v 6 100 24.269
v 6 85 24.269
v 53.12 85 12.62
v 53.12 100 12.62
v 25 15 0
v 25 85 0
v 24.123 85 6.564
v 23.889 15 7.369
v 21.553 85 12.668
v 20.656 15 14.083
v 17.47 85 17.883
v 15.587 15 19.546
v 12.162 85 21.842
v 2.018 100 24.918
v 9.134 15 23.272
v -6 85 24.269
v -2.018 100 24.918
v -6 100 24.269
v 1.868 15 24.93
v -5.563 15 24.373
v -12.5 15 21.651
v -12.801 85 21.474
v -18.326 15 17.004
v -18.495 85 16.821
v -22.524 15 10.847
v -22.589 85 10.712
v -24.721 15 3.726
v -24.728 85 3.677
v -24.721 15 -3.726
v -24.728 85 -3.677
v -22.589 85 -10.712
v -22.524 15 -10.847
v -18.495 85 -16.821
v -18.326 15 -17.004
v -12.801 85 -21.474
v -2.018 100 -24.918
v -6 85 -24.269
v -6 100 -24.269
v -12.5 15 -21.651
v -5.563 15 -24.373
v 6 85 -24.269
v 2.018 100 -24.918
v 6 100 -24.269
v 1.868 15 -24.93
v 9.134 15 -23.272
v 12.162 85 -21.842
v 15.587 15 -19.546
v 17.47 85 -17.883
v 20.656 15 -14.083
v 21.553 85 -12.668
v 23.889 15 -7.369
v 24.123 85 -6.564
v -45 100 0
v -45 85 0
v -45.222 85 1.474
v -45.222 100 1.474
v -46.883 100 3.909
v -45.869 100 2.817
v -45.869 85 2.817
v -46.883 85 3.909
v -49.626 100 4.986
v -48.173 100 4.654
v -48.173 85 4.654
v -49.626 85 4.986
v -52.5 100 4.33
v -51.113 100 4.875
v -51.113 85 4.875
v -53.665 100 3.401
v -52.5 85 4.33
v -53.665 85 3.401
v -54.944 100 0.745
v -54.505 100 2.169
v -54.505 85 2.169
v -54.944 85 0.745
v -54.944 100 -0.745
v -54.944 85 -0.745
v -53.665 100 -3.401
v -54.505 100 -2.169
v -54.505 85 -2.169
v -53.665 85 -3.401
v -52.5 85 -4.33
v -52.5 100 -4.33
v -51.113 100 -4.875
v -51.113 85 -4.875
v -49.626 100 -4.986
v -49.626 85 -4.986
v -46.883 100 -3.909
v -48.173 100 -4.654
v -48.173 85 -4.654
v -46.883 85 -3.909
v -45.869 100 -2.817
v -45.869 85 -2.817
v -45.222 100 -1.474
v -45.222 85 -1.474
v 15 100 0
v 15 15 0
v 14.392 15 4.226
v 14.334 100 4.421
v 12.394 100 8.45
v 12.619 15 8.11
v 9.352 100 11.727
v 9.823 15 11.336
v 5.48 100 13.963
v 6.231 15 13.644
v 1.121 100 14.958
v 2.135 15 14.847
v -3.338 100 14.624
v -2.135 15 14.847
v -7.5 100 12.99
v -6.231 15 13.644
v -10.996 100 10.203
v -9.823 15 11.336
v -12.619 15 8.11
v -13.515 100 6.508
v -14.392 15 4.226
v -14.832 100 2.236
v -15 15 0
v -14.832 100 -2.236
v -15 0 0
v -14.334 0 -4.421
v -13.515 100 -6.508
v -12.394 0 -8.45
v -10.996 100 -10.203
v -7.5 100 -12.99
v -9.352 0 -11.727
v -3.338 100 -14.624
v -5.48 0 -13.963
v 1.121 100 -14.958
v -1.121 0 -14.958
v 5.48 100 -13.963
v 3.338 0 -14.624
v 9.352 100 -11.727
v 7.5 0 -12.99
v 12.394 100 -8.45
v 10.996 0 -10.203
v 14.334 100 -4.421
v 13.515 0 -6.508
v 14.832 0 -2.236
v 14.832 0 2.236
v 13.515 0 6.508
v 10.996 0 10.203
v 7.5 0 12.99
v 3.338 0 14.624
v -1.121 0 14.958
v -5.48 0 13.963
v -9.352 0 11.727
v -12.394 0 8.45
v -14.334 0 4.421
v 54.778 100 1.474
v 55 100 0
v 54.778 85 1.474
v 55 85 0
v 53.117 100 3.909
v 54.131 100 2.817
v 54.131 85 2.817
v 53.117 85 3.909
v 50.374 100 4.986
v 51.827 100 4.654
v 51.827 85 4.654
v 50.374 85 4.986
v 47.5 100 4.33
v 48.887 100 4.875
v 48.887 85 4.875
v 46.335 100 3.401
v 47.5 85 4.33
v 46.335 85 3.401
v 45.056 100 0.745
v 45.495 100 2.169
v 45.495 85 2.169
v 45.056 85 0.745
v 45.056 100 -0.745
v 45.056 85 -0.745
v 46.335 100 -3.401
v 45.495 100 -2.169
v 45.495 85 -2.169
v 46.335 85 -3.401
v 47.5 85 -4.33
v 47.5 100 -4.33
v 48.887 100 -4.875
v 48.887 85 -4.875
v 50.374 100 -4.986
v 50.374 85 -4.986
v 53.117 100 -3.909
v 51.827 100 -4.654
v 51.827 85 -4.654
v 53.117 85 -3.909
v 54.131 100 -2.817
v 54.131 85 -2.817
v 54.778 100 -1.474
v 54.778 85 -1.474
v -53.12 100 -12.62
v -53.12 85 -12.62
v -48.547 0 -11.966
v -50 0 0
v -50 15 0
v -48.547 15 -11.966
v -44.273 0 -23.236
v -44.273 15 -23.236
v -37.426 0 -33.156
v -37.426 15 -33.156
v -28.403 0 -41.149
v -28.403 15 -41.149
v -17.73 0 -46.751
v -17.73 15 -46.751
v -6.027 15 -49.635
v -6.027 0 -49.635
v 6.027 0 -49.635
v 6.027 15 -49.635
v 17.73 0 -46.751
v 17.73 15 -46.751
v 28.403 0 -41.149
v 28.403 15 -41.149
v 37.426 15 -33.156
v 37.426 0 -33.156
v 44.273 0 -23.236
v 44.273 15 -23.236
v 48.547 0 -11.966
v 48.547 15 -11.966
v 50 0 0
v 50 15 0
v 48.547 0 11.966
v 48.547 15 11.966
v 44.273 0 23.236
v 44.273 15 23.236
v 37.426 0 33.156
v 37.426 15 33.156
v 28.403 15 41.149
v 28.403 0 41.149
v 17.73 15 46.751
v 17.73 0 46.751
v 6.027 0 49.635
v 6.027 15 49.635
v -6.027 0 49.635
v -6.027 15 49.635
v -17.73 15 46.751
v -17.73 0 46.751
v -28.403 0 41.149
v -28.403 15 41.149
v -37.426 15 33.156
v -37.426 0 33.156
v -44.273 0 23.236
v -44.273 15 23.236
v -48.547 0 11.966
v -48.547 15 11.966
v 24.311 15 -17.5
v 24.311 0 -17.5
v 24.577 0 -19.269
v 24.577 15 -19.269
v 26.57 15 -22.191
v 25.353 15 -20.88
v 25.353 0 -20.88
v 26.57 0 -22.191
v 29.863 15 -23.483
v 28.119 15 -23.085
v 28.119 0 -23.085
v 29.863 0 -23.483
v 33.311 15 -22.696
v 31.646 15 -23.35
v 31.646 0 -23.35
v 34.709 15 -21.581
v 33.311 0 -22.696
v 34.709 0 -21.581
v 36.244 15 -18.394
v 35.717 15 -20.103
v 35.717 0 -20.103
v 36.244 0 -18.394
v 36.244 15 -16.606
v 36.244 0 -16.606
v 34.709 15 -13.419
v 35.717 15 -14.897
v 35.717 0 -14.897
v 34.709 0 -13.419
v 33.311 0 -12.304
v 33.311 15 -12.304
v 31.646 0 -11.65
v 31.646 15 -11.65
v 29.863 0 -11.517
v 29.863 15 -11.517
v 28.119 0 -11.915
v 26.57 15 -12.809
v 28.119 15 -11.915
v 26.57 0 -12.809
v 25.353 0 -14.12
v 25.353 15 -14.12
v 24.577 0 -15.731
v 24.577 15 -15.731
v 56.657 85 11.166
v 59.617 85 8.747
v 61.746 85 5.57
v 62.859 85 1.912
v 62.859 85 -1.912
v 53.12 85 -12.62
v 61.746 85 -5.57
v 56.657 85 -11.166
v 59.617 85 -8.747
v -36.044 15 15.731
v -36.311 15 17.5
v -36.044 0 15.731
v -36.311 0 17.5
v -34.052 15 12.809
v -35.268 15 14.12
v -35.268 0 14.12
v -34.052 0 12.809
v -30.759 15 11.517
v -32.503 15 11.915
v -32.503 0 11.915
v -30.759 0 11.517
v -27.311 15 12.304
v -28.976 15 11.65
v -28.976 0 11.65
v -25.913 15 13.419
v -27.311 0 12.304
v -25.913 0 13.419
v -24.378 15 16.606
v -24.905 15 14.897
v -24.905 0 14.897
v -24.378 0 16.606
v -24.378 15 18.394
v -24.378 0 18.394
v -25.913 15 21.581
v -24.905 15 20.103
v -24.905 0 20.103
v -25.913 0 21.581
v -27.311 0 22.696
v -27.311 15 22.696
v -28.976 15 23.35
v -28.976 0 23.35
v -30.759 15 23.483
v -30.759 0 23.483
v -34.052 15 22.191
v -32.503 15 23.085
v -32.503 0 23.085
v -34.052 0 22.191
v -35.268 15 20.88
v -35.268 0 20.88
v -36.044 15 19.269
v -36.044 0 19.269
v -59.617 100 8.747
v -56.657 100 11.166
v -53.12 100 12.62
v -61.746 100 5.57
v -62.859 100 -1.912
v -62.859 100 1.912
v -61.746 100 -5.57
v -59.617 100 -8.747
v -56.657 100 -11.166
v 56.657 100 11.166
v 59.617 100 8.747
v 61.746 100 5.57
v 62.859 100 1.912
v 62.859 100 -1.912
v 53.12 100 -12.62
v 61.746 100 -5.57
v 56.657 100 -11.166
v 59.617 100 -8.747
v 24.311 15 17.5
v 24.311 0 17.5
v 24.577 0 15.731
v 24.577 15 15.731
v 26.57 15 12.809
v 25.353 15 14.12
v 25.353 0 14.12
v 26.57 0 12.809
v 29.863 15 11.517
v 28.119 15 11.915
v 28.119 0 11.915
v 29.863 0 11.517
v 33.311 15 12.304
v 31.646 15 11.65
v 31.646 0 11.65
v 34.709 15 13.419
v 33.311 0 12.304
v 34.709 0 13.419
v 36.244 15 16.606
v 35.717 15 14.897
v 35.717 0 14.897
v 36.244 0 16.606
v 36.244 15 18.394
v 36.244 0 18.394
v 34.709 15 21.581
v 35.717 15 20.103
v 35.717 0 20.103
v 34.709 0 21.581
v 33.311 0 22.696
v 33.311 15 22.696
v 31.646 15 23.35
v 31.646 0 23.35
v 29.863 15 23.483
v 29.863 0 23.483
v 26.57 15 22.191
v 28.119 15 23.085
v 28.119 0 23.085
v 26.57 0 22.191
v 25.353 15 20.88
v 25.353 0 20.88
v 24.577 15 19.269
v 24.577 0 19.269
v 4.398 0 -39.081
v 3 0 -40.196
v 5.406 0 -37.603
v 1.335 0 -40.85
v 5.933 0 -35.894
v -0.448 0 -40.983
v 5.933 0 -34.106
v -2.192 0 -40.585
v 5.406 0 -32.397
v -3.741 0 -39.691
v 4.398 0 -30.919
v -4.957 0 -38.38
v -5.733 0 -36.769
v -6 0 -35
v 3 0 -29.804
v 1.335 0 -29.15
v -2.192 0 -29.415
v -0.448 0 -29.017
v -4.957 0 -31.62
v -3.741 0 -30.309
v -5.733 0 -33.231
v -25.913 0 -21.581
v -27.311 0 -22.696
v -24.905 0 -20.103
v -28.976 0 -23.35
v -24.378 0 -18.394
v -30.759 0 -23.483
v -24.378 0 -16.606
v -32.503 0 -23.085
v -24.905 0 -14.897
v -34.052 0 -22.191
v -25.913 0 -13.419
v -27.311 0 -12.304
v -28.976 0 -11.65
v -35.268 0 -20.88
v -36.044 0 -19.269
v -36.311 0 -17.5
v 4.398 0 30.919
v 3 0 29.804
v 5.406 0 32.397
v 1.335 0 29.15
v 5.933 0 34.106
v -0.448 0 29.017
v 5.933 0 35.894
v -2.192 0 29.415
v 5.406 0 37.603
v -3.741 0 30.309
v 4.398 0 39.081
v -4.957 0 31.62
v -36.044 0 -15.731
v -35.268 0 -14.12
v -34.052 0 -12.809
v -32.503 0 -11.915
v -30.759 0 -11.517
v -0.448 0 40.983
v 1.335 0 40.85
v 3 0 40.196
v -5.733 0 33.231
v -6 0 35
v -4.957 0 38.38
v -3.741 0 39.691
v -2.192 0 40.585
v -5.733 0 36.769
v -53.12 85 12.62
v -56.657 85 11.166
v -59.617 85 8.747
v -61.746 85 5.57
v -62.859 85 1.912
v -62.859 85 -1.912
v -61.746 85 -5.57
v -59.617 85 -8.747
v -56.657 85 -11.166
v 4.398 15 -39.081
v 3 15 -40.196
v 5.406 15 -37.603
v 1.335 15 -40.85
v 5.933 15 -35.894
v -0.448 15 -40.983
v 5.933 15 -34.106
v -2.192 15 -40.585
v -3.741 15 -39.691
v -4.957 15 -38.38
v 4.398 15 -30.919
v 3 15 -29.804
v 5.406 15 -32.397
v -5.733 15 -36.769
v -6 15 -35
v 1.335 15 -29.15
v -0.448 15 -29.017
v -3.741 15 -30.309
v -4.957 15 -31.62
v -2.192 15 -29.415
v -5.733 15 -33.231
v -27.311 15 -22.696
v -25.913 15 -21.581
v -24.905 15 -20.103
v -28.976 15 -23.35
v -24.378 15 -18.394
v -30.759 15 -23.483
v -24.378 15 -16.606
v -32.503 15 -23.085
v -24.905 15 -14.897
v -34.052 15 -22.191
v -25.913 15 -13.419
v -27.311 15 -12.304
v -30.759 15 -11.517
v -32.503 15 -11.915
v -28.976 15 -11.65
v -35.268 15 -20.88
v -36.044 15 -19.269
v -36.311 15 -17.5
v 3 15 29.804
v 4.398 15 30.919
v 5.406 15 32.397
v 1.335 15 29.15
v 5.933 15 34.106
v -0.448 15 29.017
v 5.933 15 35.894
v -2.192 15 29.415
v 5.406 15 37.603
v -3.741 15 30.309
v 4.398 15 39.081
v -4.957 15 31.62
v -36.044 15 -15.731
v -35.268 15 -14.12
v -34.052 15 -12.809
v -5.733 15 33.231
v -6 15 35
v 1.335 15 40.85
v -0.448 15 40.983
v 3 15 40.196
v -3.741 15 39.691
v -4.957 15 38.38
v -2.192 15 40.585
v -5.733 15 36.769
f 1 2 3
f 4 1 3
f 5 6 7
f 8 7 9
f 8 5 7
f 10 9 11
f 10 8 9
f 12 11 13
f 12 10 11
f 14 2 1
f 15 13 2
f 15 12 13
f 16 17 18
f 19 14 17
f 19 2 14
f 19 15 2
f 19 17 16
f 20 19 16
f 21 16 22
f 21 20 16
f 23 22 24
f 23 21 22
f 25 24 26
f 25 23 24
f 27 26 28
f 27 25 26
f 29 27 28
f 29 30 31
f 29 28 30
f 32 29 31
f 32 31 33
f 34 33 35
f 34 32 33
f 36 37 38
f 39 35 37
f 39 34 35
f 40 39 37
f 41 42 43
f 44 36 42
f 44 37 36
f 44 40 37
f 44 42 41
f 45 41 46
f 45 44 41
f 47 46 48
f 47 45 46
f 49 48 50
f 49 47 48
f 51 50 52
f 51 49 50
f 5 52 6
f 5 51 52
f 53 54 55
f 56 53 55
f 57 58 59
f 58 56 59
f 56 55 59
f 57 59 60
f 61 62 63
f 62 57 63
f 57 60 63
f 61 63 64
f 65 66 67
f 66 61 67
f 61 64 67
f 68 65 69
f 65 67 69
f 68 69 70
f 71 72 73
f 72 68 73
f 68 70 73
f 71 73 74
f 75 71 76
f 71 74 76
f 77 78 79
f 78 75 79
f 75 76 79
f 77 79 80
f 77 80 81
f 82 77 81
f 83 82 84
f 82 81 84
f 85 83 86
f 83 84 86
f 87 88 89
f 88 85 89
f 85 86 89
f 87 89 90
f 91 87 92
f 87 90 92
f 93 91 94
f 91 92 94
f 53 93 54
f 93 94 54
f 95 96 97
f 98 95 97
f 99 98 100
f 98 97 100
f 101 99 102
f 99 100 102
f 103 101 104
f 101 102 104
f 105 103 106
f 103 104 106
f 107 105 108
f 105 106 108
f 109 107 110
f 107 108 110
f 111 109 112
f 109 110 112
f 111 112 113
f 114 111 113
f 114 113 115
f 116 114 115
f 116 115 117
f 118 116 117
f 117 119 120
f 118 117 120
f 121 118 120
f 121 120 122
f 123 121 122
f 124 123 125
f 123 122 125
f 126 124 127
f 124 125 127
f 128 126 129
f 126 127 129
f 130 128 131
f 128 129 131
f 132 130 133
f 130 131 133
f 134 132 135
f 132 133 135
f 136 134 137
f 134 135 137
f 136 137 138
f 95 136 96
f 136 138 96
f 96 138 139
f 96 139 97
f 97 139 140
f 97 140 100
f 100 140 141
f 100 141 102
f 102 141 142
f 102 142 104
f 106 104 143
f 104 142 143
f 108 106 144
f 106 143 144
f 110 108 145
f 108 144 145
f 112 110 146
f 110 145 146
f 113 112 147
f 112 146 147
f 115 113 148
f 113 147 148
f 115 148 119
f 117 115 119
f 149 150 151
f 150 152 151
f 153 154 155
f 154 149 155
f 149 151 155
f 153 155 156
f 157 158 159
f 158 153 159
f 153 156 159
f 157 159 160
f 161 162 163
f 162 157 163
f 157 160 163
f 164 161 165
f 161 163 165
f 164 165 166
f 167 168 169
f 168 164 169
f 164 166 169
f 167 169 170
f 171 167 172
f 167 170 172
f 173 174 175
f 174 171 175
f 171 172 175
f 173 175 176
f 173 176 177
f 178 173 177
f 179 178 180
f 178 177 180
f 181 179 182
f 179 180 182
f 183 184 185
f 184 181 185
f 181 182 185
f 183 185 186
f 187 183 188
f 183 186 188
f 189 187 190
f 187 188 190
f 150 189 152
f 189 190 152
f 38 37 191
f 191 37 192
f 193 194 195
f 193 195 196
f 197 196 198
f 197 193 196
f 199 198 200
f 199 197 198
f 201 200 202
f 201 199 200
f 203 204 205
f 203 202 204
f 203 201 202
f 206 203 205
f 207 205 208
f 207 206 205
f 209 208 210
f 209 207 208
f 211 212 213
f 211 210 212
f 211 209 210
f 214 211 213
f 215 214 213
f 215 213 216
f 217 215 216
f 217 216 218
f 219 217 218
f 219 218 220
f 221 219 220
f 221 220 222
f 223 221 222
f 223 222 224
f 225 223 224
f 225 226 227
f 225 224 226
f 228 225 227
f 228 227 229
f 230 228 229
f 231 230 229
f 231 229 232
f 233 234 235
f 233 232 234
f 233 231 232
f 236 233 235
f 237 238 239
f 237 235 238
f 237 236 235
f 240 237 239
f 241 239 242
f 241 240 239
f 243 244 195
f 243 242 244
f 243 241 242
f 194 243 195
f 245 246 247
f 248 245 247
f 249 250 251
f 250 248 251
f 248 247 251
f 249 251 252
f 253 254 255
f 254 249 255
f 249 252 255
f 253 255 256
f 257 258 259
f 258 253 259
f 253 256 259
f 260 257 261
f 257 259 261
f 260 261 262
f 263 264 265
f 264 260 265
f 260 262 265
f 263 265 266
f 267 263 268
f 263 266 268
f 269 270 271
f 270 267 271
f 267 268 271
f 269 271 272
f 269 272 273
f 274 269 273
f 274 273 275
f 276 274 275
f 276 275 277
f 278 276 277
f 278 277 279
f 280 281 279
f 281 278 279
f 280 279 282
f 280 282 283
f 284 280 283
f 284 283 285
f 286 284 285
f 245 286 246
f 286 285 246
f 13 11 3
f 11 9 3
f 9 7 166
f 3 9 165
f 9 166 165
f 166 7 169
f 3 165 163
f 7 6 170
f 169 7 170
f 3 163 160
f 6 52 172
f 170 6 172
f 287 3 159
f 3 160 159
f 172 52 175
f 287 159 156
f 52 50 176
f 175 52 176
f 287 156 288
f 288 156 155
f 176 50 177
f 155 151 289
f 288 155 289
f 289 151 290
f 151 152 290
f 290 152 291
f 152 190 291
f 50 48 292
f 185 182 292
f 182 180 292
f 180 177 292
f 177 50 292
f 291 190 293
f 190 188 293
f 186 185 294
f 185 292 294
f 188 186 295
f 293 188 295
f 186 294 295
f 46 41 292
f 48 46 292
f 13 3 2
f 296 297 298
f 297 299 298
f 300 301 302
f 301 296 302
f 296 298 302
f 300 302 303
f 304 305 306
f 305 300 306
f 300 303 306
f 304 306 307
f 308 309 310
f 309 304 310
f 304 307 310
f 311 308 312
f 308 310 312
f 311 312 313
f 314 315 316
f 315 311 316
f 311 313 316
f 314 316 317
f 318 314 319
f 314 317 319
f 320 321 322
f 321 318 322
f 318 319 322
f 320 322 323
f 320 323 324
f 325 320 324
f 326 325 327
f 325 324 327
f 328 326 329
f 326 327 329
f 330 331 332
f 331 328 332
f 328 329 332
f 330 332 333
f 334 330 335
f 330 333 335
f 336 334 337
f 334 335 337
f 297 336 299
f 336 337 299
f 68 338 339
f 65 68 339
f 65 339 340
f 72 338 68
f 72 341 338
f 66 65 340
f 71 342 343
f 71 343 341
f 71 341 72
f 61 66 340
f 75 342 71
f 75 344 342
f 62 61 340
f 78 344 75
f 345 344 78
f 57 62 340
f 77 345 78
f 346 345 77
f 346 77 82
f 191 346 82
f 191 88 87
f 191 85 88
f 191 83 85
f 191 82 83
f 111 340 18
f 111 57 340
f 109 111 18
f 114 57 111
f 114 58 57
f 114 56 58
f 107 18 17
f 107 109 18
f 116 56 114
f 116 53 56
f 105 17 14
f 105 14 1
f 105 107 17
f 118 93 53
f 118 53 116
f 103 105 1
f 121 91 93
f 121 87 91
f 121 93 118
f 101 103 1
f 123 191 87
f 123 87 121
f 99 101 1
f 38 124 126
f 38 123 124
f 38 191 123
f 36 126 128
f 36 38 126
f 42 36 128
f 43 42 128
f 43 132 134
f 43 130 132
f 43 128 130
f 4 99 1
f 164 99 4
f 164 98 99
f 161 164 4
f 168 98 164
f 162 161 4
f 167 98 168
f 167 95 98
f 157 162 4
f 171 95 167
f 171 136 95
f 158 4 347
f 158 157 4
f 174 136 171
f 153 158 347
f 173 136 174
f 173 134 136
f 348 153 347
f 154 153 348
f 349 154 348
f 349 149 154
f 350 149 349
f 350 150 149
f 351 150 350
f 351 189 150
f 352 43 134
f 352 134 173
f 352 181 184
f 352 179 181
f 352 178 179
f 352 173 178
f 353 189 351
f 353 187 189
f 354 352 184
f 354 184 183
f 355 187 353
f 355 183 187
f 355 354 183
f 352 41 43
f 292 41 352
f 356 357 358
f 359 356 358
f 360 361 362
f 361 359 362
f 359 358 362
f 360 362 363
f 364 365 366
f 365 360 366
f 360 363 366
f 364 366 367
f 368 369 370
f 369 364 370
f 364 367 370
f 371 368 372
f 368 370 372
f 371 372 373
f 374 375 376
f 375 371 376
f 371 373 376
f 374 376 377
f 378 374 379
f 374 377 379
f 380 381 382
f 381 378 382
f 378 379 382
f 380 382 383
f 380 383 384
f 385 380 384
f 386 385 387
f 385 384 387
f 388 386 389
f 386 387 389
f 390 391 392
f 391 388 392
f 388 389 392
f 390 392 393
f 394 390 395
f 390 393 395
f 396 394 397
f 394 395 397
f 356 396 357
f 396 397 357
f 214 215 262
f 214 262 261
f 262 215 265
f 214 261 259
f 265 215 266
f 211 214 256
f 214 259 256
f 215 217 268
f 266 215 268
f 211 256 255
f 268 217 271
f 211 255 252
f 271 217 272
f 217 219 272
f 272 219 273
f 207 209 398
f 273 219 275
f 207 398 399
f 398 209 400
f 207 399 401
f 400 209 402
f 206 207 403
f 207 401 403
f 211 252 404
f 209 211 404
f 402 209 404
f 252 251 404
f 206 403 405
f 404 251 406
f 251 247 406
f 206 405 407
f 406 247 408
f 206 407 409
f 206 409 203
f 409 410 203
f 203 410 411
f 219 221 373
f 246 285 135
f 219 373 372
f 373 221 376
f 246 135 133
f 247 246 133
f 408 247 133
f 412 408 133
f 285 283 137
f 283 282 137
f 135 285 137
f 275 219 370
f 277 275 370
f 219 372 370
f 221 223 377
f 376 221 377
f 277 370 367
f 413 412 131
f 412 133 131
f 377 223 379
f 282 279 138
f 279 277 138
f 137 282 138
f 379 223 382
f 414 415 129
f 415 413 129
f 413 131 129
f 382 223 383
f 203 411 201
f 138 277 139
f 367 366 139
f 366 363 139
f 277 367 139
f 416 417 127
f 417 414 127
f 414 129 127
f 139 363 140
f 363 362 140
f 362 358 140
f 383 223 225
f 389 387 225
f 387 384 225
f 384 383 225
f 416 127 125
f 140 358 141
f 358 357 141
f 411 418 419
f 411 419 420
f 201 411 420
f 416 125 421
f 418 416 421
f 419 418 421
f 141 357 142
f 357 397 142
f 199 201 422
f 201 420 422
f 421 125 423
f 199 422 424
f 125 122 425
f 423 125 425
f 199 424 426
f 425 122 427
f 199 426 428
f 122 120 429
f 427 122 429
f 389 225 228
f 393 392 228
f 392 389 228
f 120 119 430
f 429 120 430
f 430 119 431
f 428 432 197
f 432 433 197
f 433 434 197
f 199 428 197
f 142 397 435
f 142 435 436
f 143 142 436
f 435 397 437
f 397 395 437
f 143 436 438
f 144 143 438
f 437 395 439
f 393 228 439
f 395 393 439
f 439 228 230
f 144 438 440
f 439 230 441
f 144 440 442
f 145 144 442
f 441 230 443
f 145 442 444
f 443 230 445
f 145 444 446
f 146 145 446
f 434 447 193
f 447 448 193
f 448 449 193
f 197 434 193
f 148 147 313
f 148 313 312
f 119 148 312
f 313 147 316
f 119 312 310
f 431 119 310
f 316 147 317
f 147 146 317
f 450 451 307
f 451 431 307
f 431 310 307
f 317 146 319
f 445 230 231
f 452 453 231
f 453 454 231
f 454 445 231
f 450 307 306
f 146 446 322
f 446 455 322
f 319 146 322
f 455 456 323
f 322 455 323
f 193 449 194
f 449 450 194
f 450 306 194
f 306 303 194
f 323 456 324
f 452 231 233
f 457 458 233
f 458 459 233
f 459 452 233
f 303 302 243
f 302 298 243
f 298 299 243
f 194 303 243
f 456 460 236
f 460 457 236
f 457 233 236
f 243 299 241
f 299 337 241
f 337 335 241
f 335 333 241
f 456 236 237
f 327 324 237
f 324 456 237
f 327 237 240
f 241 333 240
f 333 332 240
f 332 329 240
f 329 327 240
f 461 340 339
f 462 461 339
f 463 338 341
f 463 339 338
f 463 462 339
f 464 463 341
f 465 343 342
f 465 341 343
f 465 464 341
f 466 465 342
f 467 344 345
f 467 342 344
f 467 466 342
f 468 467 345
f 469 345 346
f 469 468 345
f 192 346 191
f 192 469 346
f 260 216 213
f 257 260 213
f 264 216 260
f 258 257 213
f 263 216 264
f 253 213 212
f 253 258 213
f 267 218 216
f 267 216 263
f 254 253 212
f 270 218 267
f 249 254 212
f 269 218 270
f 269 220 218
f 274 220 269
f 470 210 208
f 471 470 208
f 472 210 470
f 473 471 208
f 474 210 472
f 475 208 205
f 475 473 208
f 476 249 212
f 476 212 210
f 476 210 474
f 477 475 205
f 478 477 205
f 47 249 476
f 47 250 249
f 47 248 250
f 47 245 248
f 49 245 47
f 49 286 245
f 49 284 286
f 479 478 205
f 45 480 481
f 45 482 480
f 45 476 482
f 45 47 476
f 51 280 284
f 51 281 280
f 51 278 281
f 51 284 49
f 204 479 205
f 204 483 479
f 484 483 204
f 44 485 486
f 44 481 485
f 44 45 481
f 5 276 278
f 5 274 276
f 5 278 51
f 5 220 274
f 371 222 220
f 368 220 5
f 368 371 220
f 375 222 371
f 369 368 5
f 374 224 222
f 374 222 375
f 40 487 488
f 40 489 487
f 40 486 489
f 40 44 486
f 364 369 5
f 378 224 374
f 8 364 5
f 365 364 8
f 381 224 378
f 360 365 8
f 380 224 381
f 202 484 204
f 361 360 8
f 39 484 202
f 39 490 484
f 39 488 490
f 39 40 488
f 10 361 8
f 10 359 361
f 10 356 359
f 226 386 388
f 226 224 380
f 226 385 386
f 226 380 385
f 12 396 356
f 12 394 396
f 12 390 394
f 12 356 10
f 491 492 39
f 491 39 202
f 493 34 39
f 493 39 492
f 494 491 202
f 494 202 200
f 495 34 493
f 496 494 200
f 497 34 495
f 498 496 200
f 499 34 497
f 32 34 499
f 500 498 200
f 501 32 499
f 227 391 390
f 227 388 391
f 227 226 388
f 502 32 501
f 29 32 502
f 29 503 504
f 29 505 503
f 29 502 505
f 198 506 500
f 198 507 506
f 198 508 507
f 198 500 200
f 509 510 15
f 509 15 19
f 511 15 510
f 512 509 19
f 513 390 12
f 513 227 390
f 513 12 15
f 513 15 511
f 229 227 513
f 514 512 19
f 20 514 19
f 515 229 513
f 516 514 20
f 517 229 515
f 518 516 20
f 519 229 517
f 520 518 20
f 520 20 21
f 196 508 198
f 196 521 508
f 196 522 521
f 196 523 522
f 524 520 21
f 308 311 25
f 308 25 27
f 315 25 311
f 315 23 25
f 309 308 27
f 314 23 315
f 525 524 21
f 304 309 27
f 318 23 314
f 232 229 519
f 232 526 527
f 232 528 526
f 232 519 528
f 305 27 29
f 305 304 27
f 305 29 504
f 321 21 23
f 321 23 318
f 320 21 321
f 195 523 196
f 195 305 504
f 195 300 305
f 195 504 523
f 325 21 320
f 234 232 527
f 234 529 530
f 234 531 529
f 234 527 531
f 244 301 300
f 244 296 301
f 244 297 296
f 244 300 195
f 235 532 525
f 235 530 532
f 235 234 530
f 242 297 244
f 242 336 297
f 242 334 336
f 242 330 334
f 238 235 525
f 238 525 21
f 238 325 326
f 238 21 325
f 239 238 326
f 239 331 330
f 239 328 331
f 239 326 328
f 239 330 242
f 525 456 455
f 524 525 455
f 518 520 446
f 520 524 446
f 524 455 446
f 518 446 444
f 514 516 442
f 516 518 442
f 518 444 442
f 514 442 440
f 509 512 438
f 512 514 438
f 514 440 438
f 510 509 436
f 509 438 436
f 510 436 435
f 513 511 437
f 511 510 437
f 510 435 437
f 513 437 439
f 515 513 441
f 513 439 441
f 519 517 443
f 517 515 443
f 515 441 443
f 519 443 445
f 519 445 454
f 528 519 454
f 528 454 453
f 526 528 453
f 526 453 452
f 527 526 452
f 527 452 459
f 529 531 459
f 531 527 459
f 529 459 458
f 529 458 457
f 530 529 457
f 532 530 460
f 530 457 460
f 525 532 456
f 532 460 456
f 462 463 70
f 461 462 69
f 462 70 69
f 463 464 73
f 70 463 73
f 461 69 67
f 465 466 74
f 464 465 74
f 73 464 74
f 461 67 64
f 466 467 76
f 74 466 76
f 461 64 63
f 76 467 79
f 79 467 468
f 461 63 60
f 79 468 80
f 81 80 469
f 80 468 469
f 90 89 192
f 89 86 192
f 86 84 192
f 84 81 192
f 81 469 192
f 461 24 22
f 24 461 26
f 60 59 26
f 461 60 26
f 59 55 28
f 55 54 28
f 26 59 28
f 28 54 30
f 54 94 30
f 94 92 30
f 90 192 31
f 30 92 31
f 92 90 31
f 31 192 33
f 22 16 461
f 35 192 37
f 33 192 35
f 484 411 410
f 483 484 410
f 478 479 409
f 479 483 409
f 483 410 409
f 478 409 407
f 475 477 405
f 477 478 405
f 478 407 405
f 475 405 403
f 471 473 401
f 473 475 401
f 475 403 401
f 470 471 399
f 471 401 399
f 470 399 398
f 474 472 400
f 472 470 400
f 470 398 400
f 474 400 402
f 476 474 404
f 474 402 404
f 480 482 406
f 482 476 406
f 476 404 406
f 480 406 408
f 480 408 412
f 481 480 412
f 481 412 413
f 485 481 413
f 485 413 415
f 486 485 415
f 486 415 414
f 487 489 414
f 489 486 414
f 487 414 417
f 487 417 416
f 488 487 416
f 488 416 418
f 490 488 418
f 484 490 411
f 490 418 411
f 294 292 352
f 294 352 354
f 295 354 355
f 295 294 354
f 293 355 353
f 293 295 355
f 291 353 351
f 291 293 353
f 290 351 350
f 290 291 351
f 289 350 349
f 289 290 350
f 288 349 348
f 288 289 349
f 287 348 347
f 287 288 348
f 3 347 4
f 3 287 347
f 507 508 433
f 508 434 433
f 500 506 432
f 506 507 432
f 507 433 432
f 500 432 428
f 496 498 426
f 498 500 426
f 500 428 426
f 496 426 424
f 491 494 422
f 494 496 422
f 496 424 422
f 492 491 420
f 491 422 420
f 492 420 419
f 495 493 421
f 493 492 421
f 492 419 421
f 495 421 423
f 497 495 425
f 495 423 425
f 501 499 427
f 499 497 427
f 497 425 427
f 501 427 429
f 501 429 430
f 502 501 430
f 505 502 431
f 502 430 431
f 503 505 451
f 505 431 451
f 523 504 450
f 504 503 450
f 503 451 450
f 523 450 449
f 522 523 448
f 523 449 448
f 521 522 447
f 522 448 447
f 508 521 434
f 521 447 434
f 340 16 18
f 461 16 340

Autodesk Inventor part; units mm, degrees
ref_plane "YZ Plane" through (0, 0, 0) normal (1, 0, 0) x (0, 1, 0)
ref_plane "XZ Plane" through (0, 0, 0) normal (0, 1, 0) x (-1, 0, 0)
ref_plane "XY Plane" through (0, 0, 0) normal (0, 0, 1) x (1, 0, 0)
sketch "Sketch1" plane through (0, 0, 0) normal (0, 1, 0) x (-1, 0, 0)
  circle A0 centre (0, 0) radius 50
  circle A1 centre (0, 0) radius 15
  circle A2 centre (0, 0) radius 35 construction
  circle A3 centre (0, -35) radius 6
  circle A4 centre (30.3109, -17.5) radius 6
  circle A5 centre (30.3109, 17.5) radius 6
  circle A6 centre (0, 35) radius 6
  circle A7 centre (-30.3109, 17.5) radius 6
  circle A8 centre (-30.3109, -17.5) radius 6
  dimension "d2" = 70
  dimension "d0" = 100
  dimension "d1" = 30
  dimension "d3" = 12
  dimension "d6" = 360
extrude "Extrusion1" add sketch "Sketch1" along normal blind 15
sketch "Sketch2" plane through (0, 15, 0) normal (0, 1, 0) x (1, 0, 0)
  circle A0 centre (0, 0) radius 25
  circle A1 centre (0, 0) radius 15 projected
  dimension "d10" = 50
extrude "Extrusion2" add sketch "Sketch2" along normal blind 70
sketch "Sketch3" plane through (0, 85, 0) normal (0, 1, 0) x (1, 0, 0)
  circle A0 centre (-50, 0) radius 13
  circle A1 centre (-50, 0) radius 5
  circle A2 centre (50, 0) radius 13
  circle A3 centre (50, 0) radius 5
  circle A4 centre (0, 0) radius 50 construction
  circle A5 centre (0, 0) radius 25 projected
  circle A6 centre (0, 0) radius 15 projected
  line L0 (-6, 24.2693) -> (-53.12, 12.62)
  line L1 (-6, -24.2693) -> (-53.12, -12.62)
  line L2 (6, 24.2693) -> (53.12, 12.62)
  line L3 (6, -24.2693) -> (53.12, -12.62)
  dimension "d13" = 26
  dimension "d14" = 10
  dimension "d15" = 26
  dimension "d16" = 10
  dimension "d17" = 100
extrude "Extrusion3" add sketch "Sketch3" along normal blind 15
properties part number "Exercise05"
